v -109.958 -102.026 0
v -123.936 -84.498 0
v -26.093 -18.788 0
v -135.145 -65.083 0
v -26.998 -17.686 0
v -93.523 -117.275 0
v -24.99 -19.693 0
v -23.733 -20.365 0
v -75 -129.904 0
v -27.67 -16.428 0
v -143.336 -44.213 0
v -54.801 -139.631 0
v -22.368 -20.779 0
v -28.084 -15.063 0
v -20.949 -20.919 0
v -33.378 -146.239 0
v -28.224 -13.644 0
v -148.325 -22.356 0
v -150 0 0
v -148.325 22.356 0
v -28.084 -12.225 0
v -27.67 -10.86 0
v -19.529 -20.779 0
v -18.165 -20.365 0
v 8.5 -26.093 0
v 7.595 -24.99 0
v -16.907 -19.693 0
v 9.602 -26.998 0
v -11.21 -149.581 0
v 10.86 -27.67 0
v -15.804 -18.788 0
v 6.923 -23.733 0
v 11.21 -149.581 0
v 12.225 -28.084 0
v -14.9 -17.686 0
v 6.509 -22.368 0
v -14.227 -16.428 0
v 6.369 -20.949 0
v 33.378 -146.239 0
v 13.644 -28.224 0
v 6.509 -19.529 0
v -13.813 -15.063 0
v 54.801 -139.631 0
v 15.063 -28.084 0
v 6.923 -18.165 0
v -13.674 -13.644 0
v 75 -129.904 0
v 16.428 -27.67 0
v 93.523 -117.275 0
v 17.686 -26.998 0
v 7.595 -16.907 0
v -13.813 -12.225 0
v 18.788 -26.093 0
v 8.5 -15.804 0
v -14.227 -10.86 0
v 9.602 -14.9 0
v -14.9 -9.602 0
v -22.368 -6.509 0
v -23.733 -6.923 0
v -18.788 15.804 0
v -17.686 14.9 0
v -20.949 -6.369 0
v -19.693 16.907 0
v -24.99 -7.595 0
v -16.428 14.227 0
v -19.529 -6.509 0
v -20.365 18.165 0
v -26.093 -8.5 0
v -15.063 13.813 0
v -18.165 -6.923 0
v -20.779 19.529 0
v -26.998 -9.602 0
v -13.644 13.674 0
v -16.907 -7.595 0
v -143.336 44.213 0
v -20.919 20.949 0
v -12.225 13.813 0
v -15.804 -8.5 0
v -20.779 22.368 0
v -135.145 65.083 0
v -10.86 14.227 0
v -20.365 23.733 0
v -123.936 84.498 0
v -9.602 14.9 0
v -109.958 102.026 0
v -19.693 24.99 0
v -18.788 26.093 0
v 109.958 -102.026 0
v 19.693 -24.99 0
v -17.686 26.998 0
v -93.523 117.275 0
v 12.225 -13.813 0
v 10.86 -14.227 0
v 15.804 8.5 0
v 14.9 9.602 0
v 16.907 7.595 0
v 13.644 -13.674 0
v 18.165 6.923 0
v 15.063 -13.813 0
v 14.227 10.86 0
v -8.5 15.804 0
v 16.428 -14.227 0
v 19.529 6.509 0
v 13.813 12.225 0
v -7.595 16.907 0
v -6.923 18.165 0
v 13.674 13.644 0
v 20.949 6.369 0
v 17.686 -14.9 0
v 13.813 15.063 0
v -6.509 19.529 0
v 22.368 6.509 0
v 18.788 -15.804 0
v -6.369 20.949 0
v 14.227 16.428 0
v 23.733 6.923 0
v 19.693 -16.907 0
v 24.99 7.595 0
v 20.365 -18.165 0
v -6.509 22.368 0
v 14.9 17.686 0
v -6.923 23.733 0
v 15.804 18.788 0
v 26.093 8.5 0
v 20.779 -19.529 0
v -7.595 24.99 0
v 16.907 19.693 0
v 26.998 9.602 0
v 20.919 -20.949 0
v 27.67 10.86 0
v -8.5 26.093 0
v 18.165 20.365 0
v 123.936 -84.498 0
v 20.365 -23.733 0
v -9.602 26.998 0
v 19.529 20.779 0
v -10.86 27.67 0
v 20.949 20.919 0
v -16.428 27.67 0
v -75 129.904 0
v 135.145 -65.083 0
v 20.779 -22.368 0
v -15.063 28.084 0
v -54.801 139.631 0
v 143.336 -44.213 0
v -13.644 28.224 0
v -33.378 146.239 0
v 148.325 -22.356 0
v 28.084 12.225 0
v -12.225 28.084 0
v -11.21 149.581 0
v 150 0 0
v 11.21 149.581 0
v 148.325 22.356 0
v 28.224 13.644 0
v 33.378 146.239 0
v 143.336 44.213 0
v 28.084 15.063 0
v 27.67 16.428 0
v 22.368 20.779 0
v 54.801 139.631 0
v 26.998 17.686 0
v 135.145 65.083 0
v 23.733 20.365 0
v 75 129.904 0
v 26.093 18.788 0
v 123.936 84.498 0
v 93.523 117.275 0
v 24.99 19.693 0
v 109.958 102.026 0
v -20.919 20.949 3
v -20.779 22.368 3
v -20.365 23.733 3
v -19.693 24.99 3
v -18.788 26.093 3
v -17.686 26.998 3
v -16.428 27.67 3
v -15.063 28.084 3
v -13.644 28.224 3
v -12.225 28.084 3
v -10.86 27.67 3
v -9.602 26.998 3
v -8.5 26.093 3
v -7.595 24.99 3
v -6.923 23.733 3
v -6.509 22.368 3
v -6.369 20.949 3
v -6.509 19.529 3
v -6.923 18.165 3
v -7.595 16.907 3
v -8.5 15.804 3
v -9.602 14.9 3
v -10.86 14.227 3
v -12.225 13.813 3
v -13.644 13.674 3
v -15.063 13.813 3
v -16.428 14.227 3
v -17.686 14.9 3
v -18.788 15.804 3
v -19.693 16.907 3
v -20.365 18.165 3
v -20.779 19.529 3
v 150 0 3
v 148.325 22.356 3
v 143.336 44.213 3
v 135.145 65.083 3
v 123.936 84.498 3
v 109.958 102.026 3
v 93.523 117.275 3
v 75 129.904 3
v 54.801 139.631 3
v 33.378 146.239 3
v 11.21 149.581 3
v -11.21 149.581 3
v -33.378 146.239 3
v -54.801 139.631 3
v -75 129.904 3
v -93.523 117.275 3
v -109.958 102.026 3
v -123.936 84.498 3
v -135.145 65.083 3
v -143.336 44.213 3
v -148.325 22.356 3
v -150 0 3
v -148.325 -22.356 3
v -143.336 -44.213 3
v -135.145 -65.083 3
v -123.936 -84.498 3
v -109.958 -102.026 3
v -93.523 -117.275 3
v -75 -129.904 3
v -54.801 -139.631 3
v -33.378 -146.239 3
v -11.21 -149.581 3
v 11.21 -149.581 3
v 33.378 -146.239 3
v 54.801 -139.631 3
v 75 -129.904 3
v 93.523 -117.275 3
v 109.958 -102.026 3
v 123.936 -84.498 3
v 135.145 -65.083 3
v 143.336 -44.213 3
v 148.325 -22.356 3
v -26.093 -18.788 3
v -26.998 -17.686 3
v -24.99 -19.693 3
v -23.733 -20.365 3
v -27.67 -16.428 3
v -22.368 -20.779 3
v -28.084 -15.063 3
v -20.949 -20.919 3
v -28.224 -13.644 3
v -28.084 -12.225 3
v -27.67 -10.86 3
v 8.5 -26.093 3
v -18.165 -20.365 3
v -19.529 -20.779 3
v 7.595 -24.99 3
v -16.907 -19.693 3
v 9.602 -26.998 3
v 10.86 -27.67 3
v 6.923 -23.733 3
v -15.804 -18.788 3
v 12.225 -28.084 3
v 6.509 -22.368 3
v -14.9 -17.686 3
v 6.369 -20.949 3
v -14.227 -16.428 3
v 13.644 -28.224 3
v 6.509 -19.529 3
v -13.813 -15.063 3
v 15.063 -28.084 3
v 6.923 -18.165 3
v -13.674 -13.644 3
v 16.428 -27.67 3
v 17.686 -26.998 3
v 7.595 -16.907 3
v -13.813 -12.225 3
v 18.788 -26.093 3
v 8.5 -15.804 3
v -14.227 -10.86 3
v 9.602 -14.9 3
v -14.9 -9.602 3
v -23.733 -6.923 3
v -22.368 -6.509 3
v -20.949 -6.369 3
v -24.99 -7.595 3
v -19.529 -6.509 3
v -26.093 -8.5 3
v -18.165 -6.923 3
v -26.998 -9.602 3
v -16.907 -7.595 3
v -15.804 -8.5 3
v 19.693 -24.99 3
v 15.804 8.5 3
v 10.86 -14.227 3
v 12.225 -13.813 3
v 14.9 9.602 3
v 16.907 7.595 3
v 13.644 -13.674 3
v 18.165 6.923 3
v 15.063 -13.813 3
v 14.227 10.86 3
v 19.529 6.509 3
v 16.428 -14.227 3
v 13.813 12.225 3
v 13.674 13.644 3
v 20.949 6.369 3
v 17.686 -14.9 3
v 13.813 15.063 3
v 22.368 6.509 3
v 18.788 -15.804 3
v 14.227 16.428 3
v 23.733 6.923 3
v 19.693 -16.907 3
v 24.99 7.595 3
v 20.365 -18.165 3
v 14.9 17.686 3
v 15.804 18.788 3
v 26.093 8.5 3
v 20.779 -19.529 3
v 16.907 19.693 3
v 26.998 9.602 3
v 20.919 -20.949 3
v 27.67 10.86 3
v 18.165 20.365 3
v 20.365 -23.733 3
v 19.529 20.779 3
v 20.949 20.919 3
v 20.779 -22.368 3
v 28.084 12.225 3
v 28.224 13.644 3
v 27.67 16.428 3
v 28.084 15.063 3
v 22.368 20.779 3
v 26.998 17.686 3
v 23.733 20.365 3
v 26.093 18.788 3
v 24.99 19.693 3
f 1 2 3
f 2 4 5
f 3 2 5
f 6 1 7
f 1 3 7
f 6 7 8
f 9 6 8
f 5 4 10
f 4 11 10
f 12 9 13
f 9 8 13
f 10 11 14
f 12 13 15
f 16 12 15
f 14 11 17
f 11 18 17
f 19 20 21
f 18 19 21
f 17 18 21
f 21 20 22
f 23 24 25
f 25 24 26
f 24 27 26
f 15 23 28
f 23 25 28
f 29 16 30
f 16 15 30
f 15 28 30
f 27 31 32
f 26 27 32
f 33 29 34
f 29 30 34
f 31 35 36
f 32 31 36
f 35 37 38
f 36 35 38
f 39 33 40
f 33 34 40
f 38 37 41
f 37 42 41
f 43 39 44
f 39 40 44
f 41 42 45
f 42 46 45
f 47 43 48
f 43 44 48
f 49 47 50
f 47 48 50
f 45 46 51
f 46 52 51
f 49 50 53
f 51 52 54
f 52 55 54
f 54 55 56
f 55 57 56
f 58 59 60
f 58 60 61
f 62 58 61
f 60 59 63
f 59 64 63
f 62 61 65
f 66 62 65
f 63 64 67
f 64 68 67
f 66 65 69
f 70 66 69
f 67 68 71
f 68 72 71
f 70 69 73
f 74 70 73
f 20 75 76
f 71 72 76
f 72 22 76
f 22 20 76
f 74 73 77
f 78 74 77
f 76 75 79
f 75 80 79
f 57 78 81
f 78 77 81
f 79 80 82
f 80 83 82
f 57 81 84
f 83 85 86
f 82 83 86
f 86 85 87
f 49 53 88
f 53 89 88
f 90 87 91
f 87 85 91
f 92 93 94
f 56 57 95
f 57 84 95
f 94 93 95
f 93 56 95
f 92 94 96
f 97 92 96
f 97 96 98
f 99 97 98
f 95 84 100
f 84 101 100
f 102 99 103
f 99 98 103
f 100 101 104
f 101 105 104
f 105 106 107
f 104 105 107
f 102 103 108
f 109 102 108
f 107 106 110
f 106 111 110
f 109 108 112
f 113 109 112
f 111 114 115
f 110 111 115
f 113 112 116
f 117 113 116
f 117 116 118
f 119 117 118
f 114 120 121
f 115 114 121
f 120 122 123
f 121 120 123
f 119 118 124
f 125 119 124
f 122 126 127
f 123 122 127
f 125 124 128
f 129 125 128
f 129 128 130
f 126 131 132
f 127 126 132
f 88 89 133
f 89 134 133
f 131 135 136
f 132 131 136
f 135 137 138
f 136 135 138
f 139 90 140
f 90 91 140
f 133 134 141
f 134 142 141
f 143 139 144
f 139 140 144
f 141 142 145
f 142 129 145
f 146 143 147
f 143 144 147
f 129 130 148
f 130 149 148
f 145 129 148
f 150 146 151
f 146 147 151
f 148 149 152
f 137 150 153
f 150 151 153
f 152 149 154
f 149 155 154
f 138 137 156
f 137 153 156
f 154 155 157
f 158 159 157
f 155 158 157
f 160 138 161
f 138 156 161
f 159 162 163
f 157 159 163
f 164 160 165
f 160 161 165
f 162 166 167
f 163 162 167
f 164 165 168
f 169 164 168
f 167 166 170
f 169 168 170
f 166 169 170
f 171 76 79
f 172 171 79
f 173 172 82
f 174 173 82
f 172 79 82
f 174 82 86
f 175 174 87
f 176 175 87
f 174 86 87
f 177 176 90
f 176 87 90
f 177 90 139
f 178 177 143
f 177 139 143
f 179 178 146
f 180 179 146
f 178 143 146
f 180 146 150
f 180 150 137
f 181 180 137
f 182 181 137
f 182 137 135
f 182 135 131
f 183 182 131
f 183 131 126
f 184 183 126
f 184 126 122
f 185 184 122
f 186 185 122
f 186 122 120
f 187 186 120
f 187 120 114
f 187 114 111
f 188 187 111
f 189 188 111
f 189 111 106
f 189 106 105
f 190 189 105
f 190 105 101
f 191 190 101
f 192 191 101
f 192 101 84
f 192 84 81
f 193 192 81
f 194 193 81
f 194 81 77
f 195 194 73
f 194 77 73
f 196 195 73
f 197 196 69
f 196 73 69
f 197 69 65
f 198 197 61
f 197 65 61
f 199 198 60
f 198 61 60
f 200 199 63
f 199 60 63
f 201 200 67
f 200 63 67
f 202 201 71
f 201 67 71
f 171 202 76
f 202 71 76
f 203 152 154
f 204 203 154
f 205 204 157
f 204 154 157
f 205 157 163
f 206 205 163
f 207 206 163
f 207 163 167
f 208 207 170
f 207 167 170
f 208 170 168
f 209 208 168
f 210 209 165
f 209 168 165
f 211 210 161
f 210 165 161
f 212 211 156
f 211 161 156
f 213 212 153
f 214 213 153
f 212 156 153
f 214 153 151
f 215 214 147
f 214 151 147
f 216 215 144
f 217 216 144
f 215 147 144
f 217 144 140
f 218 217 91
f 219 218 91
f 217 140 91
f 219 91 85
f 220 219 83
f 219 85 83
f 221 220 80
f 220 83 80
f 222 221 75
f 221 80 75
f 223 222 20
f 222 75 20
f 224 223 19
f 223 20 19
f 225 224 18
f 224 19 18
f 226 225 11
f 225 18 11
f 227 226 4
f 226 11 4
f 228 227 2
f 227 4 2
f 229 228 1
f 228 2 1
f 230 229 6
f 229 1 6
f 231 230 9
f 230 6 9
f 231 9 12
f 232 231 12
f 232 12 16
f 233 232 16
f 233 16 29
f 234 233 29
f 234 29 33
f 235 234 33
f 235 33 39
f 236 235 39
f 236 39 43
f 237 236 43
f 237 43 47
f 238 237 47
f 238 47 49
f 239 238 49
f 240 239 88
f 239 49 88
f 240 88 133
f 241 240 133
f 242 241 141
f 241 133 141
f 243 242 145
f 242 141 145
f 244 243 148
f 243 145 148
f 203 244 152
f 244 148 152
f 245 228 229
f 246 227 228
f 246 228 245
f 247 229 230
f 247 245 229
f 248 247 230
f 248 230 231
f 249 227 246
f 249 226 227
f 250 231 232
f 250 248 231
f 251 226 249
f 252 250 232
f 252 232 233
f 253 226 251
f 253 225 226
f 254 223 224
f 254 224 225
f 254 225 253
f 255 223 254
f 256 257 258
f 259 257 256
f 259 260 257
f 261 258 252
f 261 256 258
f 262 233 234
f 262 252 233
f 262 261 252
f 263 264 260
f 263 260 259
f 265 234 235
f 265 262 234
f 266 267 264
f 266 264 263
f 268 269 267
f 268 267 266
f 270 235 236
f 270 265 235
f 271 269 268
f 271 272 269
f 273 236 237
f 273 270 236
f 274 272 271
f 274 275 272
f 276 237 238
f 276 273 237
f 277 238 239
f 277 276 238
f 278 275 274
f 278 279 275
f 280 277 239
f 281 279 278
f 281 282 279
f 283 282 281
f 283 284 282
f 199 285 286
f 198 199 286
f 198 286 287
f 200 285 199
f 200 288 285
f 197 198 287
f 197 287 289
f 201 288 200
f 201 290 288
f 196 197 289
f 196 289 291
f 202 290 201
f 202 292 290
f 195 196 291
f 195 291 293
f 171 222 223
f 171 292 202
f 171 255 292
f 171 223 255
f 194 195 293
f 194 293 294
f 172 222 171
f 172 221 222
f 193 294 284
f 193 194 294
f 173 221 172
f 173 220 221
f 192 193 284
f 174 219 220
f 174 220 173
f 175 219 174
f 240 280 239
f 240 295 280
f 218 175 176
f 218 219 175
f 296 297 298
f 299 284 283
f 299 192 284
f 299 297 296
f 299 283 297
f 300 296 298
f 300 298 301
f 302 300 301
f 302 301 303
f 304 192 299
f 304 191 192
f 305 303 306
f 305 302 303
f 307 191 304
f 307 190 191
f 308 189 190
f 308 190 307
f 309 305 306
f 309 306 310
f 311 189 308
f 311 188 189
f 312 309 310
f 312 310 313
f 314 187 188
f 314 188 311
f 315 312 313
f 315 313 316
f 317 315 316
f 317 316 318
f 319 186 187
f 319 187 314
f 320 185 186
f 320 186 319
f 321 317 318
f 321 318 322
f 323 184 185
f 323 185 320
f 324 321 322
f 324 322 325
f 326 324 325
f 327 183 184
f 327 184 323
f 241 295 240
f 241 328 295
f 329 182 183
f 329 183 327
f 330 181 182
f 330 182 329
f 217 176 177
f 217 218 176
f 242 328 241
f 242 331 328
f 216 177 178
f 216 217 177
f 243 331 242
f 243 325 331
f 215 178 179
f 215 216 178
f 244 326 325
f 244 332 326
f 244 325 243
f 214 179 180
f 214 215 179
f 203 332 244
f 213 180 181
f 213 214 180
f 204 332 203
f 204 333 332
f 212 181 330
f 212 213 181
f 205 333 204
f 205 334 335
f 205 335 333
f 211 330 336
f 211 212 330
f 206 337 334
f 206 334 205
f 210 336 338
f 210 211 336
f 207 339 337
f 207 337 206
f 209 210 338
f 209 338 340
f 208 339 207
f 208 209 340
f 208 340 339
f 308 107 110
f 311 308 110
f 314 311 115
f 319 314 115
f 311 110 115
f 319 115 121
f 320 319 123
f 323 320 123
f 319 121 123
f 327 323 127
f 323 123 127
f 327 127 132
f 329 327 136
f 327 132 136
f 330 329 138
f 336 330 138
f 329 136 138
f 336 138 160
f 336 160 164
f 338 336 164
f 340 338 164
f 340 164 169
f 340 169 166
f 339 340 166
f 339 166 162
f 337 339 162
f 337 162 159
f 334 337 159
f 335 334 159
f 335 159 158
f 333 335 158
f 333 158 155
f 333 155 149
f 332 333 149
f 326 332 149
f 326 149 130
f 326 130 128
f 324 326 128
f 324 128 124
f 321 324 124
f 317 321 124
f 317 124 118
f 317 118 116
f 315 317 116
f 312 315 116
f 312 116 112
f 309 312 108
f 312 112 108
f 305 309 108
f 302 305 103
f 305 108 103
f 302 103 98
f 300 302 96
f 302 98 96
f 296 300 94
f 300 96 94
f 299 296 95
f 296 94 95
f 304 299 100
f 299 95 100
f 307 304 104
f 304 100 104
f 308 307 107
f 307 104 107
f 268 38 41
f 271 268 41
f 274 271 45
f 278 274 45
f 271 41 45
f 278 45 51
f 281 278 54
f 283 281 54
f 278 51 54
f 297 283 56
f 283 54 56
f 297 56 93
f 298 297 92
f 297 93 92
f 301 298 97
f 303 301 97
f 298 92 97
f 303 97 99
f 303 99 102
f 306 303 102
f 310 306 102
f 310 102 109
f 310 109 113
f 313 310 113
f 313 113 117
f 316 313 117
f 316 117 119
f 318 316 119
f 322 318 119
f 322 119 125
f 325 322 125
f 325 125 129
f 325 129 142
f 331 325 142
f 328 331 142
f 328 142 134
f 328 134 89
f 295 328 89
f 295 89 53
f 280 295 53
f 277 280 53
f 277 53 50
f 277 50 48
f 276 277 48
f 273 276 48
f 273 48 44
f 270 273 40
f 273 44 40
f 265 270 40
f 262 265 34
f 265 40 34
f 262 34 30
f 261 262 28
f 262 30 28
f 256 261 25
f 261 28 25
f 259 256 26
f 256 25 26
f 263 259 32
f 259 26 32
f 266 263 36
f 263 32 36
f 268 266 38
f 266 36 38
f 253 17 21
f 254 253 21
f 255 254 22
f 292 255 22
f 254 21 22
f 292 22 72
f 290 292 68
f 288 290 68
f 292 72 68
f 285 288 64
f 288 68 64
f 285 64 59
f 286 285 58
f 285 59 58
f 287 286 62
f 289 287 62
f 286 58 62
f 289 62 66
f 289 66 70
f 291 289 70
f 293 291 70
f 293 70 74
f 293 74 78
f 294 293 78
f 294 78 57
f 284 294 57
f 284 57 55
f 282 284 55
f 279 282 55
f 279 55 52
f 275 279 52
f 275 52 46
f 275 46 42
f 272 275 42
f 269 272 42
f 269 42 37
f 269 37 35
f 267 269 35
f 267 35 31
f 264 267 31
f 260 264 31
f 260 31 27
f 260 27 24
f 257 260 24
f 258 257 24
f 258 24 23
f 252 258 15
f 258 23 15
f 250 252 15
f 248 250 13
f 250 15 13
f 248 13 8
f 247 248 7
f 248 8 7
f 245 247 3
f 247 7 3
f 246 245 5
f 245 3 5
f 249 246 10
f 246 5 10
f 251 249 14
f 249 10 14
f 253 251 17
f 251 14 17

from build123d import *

# Parameters (mm, degrees)
SKETCH1_R                               = 150
BOSS_EXTRUDE2_DEPTH                     = 3
CBORE_FOR_M6_HEX_HEAD_BOLT1_D           = 6.6
CBORE_FOR_M6_HEX_HEAD_BOLT1_CBORE_D     = 14.55
CBORE_FOR_M6_HEX_HEAD_BOLT1_CBORE_DEPTH = 4.38


with BuildPart() as part:
    # Sketch1 → Boss-Extrude2 (new body)
    with BuildSketch(Plane.XY):
        Circle(SKETCH1_R)
    extrude(amount=BOSS_EXTRUDE2_DEPTH)

    # CBORE for M6 Hex Head Bolt1 (through all)
    with Locations(Plane(origin=(0, 0, 0), x_dir=(-1, 0, 0), z_dir=(0, 0, -1))):
        with Locations((-20.948618644, 13.643876902), (13.643876902, 20.948618644), (20.948618644, -13.643876902), (-13.643876902, -20.948618644)):
            CounterBoreHole(CBORE_FOR_M6_HEX_HEAD_BOLT1_D / 2, CBORE_FOR_M6_HEX_HEAD_BOLT1_CBORE_D / 2, CBORE_FOR_M6_HEX_HEAD_BOLT1_CBORE_DEPTH)


solid = part.part
